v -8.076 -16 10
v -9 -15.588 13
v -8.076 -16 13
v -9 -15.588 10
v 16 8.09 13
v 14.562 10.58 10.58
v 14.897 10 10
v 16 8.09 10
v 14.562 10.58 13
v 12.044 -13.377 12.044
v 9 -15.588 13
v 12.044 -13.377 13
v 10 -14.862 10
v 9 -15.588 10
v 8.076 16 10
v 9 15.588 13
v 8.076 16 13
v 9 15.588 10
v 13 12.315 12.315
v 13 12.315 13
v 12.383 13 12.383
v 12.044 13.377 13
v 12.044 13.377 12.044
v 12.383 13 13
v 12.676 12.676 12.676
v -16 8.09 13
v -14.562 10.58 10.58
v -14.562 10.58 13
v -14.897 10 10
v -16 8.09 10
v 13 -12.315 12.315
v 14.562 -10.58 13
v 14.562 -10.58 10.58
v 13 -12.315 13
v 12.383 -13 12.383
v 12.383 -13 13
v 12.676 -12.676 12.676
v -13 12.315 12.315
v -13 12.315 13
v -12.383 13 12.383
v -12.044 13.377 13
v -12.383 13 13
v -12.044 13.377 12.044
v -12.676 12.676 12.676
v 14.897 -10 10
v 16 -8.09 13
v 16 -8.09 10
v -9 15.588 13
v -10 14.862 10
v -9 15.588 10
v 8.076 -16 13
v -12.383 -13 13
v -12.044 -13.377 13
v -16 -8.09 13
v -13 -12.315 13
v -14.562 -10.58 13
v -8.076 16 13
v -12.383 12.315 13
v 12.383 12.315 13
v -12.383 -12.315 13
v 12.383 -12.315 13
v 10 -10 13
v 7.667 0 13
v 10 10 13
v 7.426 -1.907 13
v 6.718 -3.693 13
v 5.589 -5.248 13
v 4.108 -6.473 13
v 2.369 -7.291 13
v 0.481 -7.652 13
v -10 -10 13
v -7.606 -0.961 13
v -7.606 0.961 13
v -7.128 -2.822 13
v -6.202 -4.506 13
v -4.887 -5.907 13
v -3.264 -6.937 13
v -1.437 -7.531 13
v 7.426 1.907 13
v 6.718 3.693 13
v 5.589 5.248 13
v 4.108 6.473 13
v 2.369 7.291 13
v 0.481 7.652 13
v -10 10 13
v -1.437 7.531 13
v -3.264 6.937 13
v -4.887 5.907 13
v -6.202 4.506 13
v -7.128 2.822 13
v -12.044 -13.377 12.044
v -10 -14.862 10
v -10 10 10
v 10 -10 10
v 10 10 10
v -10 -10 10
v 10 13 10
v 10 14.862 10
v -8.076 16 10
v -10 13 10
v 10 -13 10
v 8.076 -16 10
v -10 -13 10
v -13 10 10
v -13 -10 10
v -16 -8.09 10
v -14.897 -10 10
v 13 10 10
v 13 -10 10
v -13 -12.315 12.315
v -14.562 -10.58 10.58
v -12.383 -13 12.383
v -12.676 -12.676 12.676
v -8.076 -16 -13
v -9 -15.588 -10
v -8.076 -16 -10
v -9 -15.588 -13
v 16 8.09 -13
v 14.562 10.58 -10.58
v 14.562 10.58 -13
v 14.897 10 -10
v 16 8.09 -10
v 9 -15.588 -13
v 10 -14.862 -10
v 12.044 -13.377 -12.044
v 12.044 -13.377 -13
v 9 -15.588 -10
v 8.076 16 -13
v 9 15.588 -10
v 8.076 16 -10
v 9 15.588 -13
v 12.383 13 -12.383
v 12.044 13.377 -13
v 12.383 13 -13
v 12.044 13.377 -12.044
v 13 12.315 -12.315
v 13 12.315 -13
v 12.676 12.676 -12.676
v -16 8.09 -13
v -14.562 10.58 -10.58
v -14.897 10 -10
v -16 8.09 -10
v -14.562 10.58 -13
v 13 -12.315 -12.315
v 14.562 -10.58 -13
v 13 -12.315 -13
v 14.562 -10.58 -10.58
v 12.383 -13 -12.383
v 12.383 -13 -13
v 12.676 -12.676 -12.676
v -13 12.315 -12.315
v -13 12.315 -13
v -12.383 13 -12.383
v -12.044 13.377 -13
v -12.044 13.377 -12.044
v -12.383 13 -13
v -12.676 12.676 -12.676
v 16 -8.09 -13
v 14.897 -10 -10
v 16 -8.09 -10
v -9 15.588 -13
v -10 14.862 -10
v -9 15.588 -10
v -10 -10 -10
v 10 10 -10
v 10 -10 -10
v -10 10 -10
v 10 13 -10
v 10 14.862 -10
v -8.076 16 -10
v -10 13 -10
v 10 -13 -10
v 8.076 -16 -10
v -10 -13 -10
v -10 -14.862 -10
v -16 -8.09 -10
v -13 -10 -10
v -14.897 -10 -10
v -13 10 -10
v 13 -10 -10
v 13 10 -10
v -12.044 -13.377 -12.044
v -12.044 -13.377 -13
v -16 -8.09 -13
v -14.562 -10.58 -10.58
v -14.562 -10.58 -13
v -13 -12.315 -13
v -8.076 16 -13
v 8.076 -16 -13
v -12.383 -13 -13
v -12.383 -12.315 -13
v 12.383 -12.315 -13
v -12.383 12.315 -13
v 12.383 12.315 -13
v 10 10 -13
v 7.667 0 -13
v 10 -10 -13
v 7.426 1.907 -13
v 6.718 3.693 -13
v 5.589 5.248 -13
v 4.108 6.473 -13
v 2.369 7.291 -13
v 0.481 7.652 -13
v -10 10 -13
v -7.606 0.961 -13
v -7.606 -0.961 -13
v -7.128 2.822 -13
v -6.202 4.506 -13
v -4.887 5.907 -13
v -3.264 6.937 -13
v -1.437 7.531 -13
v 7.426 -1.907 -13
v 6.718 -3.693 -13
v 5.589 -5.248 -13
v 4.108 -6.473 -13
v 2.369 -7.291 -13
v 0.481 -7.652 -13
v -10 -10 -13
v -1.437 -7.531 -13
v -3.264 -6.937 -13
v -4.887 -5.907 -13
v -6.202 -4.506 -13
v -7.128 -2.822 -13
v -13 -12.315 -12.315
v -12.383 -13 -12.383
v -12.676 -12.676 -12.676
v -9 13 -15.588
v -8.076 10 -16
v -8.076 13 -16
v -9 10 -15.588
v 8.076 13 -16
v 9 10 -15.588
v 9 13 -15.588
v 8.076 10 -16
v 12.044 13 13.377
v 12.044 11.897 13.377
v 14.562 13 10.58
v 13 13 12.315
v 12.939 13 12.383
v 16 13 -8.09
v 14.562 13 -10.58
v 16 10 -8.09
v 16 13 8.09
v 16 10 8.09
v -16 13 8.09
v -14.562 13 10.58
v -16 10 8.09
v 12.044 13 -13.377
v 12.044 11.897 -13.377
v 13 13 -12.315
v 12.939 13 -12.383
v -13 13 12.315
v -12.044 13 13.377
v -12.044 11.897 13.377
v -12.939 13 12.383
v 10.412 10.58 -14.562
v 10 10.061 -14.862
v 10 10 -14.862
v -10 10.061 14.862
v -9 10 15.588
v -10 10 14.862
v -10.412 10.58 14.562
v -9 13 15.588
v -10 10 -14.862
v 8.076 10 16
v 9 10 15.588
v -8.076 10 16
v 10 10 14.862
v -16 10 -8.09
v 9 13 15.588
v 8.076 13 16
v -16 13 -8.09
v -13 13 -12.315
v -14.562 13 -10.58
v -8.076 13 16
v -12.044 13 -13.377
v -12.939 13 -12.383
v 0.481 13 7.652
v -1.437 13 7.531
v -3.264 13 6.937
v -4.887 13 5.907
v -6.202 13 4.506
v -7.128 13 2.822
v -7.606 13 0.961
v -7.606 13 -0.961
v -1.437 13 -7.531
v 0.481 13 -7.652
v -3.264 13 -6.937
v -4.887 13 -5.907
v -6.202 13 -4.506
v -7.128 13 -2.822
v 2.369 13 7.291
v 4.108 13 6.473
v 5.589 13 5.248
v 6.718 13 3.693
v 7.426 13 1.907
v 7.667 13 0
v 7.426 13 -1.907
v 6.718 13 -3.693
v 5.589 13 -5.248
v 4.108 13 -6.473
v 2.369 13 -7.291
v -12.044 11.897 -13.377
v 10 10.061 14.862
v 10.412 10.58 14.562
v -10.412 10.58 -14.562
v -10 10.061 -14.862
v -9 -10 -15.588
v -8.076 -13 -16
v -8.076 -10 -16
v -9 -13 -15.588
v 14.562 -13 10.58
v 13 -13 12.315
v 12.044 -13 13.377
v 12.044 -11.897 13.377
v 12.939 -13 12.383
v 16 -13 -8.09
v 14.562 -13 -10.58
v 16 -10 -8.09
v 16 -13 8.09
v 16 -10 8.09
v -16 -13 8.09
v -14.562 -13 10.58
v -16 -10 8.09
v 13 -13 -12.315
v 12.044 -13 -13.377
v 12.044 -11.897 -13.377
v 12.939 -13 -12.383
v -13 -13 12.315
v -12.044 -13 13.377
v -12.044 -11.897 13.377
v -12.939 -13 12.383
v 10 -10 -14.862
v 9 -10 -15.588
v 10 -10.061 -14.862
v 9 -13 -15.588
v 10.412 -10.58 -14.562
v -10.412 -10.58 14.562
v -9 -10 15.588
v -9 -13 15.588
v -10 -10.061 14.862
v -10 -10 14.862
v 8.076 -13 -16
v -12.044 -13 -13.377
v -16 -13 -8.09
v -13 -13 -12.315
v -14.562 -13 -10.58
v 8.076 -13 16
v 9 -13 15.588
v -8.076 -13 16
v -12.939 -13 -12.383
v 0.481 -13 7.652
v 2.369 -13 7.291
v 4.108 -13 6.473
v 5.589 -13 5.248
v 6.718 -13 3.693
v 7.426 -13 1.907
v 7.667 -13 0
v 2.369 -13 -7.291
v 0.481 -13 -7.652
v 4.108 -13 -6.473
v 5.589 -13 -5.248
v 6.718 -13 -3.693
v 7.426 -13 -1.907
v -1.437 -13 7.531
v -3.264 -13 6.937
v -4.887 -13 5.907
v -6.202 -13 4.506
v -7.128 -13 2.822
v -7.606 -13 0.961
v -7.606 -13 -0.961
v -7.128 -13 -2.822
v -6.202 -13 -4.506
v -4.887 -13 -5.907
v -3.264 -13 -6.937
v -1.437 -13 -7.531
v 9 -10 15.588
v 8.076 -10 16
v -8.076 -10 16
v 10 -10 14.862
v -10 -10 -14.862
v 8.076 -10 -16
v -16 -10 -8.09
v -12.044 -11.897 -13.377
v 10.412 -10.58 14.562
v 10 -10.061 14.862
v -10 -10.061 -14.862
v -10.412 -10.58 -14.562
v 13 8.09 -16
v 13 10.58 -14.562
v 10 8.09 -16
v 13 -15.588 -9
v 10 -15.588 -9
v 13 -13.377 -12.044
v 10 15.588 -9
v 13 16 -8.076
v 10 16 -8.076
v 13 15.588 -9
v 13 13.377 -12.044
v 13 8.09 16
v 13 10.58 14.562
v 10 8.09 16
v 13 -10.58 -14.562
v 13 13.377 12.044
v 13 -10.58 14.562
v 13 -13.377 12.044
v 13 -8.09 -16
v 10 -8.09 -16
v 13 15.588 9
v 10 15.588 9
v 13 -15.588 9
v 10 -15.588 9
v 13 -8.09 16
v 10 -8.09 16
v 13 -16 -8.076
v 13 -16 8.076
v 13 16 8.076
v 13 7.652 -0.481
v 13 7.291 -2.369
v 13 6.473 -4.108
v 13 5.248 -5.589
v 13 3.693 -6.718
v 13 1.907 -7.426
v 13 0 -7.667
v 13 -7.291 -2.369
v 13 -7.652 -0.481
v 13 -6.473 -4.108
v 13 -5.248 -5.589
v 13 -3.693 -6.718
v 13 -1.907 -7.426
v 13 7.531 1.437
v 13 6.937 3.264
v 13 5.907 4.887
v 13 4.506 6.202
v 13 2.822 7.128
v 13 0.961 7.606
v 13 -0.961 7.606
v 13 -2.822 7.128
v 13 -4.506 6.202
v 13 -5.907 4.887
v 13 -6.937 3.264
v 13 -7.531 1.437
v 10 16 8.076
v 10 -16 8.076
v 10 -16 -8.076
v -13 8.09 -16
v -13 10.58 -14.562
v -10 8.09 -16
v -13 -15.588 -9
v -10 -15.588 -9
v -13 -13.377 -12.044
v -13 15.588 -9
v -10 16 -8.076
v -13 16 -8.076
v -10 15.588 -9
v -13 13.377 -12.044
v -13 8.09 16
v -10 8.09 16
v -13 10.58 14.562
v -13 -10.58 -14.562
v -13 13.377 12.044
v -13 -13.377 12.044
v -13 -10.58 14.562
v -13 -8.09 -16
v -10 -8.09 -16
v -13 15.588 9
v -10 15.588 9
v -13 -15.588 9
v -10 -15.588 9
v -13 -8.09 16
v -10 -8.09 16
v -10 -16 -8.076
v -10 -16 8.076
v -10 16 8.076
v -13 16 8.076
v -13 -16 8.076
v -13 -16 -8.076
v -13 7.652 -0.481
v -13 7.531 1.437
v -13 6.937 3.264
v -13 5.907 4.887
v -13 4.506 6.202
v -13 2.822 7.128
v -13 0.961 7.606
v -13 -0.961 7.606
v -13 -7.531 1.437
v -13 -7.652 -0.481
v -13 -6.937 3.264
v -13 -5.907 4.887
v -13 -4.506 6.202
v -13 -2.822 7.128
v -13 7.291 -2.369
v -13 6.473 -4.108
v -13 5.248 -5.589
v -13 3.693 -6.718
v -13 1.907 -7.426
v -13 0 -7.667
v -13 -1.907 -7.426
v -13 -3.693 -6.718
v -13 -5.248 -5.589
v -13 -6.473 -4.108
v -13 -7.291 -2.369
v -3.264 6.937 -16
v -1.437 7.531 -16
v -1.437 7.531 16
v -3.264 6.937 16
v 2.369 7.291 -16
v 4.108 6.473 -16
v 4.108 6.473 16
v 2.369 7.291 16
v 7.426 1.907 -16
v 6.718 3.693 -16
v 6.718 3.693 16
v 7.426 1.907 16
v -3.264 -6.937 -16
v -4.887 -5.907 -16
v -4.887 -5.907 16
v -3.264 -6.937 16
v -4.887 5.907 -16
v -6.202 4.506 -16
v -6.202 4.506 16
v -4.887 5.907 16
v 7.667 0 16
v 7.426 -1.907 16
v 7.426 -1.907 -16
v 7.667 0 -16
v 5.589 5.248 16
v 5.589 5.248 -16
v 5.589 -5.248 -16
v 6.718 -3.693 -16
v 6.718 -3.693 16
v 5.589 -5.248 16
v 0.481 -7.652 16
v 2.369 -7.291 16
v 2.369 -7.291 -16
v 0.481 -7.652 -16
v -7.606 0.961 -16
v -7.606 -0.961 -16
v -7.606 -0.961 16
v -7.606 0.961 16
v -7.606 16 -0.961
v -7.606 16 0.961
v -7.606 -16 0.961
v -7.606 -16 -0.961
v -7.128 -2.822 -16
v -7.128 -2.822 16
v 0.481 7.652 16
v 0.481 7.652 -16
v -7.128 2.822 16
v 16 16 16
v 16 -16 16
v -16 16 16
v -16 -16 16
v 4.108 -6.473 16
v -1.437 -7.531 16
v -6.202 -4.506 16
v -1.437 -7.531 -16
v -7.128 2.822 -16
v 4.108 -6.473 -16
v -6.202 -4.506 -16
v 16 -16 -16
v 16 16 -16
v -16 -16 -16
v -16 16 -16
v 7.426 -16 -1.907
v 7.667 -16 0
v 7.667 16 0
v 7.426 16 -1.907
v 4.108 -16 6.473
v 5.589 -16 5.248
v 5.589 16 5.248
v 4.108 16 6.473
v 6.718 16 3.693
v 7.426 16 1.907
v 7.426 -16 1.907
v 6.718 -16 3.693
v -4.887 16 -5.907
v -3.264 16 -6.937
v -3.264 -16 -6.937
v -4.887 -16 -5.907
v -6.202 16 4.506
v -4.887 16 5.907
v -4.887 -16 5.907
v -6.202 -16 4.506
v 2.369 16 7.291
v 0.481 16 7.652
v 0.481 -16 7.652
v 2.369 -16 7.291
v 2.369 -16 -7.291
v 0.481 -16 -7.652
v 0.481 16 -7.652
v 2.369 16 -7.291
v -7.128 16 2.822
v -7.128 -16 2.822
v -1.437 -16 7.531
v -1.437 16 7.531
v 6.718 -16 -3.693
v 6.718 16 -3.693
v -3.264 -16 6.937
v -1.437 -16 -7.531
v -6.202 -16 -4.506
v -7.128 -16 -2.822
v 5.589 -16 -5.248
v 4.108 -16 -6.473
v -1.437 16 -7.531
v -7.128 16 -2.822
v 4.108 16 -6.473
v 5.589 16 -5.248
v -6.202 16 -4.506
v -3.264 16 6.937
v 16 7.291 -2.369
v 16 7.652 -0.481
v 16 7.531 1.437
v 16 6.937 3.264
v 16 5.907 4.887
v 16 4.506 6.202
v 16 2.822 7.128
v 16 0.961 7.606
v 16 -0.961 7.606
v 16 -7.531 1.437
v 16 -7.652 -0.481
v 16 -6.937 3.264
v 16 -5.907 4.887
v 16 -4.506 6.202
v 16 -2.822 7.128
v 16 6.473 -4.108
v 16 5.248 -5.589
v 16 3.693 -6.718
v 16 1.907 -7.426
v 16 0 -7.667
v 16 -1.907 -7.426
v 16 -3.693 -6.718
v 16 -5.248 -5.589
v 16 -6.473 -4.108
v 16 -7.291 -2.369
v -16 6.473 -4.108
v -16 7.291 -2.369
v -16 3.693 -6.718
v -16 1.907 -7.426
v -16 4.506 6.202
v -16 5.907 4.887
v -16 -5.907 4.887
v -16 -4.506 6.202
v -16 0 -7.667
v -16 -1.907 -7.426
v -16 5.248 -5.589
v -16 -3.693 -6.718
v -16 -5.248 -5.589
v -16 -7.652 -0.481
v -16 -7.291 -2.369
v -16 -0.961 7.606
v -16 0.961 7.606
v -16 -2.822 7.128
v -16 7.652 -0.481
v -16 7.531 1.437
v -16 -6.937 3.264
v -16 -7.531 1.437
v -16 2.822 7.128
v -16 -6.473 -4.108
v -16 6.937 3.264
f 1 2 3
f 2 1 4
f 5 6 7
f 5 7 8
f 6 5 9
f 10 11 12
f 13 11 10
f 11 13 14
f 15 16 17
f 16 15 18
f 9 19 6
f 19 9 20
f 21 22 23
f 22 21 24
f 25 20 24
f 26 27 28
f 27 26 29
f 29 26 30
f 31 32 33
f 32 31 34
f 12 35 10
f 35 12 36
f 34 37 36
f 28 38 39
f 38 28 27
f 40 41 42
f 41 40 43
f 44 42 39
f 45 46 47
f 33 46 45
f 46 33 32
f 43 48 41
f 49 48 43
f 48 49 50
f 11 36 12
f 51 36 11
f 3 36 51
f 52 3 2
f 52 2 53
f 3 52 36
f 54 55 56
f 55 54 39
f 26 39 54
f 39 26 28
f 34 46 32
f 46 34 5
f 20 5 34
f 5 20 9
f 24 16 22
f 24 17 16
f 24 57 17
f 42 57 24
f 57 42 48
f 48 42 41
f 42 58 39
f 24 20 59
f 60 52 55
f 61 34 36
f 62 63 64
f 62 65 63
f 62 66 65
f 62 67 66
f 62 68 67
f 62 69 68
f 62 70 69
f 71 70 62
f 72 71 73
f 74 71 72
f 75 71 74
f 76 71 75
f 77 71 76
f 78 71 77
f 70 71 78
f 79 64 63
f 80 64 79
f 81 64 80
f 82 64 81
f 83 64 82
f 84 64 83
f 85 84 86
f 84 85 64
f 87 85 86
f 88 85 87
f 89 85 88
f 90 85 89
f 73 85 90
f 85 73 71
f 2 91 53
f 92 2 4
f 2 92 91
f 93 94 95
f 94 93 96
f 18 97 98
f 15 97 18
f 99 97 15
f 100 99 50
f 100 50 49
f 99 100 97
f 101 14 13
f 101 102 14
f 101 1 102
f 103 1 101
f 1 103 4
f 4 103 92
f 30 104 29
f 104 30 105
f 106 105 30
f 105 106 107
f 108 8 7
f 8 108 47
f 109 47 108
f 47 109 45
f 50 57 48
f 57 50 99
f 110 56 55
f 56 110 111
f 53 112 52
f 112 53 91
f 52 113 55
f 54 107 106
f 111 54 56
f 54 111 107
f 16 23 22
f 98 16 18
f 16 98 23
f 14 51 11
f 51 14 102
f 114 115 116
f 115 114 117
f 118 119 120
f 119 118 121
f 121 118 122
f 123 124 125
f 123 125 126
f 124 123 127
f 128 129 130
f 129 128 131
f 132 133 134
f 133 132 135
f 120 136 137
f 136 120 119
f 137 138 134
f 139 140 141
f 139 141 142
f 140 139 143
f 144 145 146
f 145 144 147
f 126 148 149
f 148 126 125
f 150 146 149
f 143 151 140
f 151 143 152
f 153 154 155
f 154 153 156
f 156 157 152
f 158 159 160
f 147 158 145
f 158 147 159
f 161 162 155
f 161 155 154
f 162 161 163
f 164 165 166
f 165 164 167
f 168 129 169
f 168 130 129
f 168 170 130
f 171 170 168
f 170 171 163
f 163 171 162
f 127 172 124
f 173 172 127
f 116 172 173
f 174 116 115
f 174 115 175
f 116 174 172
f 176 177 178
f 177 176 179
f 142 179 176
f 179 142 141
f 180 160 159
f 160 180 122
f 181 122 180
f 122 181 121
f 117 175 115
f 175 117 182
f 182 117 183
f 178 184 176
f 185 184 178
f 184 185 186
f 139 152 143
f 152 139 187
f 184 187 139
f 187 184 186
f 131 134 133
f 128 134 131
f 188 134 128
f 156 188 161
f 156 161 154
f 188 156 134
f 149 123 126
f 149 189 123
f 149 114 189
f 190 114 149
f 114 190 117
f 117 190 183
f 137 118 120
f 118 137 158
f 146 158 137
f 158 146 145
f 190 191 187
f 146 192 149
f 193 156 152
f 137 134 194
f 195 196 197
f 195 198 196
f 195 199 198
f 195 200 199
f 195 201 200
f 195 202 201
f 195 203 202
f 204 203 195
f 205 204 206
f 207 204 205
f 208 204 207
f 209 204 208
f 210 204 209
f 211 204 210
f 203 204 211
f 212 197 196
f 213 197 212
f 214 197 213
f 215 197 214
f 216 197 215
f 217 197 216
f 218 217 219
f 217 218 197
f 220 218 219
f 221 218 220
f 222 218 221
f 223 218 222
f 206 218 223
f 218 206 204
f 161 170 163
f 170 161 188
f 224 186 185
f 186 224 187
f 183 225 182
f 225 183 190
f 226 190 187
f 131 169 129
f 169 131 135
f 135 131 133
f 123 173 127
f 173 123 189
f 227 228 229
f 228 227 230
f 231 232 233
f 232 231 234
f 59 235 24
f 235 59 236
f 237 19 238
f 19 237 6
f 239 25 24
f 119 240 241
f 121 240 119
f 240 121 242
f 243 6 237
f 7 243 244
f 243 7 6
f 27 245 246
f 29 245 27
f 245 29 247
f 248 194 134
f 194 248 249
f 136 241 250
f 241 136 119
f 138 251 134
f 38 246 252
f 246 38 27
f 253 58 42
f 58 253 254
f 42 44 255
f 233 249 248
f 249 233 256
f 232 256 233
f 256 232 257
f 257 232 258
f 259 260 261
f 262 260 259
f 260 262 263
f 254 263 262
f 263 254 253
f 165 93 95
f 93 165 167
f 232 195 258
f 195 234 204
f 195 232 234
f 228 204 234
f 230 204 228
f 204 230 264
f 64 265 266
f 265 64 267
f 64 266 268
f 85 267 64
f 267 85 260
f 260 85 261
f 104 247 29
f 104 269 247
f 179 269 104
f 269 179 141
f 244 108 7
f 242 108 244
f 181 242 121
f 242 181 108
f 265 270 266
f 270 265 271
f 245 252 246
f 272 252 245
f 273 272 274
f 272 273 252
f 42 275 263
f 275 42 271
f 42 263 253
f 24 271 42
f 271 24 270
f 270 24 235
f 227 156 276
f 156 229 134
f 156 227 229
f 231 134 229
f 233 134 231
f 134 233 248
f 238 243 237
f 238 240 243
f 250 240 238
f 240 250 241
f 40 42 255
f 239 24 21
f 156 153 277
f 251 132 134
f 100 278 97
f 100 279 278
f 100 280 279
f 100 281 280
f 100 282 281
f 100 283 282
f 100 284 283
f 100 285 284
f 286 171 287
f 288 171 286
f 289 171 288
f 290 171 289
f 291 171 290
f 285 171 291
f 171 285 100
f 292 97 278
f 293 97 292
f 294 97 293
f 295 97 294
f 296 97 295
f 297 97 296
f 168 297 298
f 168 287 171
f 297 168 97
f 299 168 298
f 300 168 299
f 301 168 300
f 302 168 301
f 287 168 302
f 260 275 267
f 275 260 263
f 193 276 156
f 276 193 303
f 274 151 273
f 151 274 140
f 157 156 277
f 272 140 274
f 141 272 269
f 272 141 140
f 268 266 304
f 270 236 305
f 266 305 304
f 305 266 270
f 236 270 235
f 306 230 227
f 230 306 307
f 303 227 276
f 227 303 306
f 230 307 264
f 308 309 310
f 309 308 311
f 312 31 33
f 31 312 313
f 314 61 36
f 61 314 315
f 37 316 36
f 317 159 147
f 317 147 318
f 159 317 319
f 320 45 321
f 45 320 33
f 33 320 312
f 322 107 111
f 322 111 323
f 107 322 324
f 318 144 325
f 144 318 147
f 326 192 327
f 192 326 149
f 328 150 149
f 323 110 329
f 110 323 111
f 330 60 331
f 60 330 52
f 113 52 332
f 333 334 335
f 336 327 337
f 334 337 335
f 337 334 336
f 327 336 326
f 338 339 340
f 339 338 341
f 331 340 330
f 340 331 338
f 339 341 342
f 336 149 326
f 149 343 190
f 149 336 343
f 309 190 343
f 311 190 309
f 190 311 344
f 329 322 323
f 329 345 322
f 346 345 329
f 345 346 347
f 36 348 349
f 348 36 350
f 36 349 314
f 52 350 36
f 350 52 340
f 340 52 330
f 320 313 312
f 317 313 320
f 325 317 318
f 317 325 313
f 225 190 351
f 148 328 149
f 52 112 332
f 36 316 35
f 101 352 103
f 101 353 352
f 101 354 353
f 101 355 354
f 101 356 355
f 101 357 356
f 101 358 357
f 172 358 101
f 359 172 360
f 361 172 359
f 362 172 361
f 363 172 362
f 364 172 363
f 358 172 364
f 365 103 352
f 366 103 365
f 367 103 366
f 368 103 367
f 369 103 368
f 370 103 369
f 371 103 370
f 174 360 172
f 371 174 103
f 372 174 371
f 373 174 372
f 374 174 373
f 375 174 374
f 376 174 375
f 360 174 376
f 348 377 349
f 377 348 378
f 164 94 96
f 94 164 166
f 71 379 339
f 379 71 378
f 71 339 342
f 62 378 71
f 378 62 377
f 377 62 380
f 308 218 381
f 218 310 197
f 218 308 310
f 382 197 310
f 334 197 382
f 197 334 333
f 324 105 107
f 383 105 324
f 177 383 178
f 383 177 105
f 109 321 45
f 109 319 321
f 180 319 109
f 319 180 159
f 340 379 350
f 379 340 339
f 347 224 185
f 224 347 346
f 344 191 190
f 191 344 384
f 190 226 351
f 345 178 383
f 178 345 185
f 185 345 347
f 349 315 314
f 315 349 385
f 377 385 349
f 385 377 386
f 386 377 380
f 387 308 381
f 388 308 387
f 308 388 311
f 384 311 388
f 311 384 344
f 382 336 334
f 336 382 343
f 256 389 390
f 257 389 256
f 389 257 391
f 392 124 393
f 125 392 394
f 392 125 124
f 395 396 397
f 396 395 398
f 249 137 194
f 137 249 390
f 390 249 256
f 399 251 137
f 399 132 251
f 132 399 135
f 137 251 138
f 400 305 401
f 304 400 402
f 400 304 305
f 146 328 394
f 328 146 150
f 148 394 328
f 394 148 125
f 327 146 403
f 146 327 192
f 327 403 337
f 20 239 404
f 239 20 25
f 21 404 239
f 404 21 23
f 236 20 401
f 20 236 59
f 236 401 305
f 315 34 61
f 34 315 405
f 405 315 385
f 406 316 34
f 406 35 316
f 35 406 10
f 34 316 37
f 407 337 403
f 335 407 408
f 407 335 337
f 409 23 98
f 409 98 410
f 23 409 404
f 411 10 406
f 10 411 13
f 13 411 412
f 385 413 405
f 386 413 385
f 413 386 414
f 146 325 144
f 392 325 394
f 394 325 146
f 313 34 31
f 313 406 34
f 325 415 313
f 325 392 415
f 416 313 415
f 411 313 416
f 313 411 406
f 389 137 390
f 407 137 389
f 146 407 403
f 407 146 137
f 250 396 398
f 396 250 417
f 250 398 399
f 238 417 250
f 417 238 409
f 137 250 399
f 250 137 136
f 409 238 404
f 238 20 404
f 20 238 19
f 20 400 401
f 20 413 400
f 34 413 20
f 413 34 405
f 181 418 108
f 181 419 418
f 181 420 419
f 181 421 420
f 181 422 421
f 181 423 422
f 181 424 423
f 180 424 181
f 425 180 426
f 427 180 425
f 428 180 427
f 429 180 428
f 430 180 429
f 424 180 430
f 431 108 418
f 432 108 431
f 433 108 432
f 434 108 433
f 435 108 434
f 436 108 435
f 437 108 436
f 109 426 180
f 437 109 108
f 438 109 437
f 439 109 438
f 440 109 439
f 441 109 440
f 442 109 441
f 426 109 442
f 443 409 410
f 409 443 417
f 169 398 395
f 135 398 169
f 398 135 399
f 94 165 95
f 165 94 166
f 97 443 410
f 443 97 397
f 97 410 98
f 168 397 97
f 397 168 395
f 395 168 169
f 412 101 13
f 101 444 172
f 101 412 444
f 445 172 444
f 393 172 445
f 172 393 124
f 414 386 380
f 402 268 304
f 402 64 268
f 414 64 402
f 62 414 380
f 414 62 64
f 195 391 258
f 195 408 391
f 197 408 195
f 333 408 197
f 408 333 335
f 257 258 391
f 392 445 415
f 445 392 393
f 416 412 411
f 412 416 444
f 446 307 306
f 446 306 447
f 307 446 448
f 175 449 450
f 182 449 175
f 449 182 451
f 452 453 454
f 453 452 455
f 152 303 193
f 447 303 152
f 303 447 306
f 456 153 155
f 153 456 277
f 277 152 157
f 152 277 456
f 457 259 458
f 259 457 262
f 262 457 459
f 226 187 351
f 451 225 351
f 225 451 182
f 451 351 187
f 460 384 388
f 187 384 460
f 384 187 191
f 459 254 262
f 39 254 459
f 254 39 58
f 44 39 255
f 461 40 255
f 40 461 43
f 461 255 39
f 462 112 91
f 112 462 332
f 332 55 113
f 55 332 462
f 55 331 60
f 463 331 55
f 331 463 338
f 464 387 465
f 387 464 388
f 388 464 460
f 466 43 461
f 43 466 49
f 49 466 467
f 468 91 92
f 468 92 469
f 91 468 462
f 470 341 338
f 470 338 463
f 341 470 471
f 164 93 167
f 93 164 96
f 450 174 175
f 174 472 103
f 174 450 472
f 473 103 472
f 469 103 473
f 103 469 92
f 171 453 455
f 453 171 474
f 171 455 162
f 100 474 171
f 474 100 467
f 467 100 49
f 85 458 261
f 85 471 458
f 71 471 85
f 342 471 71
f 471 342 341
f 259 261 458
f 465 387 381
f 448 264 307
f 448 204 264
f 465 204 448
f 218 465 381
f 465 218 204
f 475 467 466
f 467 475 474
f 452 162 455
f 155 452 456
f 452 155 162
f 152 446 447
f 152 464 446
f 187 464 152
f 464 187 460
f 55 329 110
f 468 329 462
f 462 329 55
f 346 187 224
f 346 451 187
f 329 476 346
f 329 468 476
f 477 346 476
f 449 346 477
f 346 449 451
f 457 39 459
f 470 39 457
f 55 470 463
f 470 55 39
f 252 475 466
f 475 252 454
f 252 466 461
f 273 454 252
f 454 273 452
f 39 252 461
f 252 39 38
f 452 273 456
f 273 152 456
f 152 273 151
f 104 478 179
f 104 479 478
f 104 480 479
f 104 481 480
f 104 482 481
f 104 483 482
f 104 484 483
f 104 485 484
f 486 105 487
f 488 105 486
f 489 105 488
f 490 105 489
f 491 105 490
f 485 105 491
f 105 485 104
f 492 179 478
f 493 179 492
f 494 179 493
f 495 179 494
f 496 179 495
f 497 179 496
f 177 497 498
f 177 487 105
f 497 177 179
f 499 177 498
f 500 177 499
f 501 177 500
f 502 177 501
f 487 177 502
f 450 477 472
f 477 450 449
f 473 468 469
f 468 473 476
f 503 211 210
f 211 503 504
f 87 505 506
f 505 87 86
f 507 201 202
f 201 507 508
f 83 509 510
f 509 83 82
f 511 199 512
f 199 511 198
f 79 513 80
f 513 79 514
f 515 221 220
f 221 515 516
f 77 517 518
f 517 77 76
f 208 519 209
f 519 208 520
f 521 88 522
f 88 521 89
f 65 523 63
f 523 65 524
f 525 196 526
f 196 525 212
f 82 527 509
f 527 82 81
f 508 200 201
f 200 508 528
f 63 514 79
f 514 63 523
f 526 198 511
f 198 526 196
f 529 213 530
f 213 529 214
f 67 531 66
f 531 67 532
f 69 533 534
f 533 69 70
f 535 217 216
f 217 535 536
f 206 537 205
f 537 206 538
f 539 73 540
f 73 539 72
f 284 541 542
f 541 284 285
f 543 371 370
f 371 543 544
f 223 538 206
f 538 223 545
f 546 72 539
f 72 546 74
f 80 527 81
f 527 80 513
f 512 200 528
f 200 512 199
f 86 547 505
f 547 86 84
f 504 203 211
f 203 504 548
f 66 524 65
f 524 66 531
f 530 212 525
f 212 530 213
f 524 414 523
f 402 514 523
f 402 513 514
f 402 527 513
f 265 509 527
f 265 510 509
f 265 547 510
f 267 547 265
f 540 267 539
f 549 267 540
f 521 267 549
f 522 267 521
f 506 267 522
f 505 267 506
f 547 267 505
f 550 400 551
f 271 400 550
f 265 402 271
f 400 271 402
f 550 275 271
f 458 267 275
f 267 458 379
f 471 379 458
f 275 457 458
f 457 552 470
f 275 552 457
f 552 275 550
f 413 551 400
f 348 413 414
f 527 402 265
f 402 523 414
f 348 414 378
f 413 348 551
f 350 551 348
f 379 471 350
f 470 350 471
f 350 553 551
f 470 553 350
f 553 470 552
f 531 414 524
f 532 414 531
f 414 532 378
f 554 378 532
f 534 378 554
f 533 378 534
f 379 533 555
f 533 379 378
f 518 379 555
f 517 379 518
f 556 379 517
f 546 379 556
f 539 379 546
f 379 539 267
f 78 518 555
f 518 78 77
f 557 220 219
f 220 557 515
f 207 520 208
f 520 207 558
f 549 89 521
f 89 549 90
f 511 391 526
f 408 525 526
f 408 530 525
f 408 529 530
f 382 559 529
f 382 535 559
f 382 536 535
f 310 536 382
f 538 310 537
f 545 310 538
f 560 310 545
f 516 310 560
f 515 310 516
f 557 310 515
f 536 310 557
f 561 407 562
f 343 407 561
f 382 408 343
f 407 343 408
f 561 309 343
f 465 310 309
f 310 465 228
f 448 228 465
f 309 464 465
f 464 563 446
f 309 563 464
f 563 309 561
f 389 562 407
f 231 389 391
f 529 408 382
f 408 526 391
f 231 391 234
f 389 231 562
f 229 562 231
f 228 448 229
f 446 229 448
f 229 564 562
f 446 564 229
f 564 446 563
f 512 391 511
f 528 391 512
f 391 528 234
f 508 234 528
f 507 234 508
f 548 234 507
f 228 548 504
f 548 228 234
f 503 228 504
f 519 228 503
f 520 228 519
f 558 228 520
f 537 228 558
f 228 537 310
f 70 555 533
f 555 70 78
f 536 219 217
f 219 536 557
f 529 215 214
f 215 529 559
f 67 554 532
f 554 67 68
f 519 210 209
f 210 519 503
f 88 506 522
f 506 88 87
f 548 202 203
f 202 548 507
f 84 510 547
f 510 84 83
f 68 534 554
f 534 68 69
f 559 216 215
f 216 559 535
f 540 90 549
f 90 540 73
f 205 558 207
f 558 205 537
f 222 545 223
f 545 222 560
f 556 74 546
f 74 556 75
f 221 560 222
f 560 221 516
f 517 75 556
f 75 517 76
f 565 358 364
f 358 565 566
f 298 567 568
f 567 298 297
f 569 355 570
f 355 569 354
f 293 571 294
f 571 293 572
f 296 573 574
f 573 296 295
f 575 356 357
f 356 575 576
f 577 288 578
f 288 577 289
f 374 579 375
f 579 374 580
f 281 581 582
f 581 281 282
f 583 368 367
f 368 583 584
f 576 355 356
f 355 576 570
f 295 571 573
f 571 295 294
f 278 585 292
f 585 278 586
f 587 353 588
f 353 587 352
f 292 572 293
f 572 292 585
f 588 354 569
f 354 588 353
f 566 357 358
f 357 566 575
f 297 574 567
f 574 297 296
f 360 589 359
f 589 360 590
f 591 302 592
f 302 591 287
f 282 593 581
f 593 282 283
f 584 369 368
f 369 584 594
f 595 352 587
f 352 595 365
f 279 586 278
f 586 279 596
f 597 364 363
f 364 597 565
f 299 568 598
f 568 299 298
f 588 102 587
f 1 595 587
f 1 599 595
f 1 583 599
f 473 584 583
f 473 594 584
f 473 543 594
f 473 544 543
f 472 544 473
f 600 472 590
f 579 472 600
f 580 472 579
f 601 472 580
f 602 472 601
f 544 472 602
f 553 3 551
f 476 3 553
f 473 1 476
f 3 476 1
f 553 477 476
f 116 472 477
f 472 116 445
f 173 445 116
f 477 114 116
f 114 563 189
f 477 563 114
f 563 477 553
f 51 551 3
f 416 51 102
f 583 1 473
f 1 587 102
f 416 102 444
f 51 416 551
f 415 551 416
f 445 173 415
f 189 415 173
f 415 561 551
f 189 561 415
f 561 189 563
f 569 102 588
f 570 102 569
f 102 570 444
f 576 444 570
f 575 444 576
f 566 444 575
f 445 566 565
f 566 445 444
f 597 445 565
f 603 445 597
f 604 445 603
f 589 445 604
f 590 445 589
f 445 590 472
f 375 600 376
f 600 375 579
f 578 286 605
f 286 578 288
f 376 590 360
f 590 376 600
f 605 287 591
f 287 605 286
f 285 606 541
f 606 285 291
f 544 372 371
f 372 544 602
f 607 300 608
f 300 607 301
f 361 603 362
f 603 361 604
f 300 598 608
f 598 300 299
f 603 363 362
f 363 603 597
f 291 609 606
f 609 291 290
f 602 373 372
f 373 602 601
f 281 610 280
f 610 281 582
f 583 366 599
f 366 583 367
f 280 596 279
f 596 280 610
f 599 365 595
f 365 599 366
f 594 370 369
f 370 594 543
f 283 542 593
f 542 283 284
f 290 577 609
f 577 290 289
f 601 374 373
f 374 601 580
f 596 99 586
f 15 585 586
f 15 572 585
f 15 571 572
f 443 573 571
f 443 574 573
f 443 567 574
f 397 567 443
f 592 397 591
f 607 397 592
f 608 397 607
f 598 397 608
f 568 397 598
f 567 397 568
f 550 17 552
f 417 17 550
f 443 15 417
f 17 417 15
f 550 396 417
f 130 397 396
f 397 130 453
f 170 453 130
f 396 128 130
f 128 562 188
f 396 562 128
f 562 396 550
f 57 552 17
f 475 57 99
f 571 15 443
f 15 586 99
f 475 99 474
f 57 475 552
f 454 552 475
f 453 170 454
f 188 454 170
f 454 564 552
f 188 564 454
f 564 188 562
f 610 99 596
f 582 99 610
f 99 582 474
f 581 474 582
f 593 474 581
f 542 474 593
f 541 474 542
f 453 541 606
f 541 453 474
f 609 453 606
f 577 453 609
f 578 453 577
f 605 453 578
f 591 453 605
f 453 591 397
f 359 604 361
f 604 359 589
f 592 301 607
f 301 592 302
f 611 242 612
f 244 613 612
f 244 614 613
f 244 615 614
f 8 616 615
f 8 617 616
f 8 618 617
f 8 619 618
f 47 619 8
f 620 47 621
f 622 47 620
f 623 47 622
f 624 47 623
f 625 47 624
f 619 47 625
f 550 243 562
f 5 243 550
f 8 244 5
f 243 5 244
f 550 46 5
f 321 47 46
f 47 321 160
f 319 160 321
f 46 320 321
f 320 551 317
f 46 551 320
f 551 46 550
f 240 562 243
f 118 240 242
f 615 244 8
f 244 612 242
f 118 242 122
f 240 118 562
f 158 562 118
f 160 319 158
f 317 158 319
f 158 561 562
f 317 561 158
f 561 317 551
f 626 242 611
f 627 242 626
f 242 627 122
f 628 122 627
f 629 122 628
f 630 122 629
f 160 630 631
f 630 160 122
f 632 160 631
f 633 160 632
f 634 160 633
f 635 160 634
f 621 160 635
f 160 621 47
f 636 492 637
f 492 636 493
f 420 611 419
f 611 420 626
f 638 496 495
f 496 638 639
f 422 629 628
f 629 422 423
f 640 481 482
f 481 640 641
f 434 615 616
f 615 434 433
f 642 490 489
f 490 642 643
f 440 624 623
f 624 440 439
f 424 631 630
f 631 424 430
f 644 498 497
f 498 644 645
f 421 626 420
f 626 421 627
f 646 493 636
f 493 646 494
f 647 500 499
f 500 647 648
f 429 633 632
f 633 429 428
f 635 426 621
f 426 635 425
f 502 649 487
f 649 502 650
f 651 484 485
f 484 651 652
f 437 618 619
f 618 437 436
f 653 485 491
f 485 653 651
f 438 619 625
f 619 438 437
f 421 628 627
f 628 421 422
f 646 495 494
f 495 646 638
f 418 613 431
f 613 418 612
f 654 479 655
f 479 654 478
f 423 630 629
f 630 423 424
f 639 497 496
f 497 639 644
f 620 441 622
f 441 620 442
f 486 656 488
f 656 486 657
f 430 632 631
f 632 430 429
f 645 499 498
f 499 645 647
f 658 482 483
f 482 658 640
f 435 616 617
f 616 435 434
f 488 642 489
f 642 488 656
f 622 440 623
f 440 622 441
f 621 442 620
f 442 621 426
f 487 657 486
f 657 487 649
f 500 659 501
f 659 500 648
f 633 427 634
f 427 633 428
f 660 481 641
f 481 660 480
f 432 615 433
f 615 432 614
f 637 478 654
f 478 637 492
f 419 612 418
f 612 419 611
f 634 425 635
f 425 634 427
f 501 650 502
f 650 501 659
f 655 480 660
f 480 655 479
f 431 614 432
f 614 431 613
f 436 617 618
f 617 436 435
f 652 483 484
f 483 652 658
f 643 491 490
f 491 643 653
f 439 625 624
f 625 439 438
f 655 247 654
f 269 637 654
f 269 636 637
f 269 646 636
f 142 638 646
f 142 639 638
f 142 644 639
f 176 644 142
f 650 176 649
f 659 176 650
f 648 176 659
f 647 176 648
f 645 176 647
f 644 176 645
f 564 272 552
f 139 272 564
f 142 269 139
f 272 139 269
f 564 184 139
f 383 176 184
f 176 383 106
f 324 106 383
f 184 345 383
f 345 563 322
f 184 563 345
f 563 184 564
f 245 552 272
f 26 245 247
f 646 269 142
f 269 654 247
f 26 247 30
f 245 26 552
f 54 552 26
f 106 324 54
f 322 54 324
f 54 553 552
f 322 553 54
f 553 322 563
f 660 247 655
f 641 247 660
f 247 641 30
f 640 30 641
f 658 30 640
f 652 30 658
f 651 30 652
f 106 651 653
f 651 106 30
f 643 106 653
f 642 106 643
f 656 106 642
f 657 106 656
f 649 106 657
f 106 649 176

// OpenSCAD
o_s=32;
i_s=20;

outer_cube();
inner_cube();

module inner_cube()
{
	cube([i_s, i_s, i_s], center=true);
}
	
module outer_cube()
{
	difference()
	{
		cube([o_s, o_s, o_s], center=true);
		union()
		{
			discs();
			holes();
		}
	}
}

module discs()
{
	rad=(o_s+(i_s/5))/2;
	ht=(o_s-i_s)/2/2;
	sh=(i_s/2)+ht/2;

	translate([0,0,sh])
	cylinder(r=rad, h=ht, center=true);
	translate([0,0,-sh])
	cylinder(r=rad, h=ht, center=true);

	translate([0,sh,0])
	rotate([90,0,0])
 	cylinder(r=rad, h=ht, center=true);
	translate([0,-sh,0])
	rotate([90,0,0])
	cylinder(r=rad, h=ht, center=true);

	translate([sh,0,0])
	rotate([0,90,0])
 	cylinder(r=rad, h=ht, center=true);
	translate([-sh,0,0])
	rotate([0,90,0])
	cylinder(r=rad, h=ht, center=true);
}

module holes()
{
	rad=(o_s-(i_s*5/6))/2;
//	rad=(i_s*1.45/2);

	cylinder(r=rad, h=o_s, center=true);
	rotate([90,0,0])
	cylinder(r=rad, h=o_s, center=true);
	rotate([0,90,0])
	cylinder(r=rad, h=o_s, center=true);
}
